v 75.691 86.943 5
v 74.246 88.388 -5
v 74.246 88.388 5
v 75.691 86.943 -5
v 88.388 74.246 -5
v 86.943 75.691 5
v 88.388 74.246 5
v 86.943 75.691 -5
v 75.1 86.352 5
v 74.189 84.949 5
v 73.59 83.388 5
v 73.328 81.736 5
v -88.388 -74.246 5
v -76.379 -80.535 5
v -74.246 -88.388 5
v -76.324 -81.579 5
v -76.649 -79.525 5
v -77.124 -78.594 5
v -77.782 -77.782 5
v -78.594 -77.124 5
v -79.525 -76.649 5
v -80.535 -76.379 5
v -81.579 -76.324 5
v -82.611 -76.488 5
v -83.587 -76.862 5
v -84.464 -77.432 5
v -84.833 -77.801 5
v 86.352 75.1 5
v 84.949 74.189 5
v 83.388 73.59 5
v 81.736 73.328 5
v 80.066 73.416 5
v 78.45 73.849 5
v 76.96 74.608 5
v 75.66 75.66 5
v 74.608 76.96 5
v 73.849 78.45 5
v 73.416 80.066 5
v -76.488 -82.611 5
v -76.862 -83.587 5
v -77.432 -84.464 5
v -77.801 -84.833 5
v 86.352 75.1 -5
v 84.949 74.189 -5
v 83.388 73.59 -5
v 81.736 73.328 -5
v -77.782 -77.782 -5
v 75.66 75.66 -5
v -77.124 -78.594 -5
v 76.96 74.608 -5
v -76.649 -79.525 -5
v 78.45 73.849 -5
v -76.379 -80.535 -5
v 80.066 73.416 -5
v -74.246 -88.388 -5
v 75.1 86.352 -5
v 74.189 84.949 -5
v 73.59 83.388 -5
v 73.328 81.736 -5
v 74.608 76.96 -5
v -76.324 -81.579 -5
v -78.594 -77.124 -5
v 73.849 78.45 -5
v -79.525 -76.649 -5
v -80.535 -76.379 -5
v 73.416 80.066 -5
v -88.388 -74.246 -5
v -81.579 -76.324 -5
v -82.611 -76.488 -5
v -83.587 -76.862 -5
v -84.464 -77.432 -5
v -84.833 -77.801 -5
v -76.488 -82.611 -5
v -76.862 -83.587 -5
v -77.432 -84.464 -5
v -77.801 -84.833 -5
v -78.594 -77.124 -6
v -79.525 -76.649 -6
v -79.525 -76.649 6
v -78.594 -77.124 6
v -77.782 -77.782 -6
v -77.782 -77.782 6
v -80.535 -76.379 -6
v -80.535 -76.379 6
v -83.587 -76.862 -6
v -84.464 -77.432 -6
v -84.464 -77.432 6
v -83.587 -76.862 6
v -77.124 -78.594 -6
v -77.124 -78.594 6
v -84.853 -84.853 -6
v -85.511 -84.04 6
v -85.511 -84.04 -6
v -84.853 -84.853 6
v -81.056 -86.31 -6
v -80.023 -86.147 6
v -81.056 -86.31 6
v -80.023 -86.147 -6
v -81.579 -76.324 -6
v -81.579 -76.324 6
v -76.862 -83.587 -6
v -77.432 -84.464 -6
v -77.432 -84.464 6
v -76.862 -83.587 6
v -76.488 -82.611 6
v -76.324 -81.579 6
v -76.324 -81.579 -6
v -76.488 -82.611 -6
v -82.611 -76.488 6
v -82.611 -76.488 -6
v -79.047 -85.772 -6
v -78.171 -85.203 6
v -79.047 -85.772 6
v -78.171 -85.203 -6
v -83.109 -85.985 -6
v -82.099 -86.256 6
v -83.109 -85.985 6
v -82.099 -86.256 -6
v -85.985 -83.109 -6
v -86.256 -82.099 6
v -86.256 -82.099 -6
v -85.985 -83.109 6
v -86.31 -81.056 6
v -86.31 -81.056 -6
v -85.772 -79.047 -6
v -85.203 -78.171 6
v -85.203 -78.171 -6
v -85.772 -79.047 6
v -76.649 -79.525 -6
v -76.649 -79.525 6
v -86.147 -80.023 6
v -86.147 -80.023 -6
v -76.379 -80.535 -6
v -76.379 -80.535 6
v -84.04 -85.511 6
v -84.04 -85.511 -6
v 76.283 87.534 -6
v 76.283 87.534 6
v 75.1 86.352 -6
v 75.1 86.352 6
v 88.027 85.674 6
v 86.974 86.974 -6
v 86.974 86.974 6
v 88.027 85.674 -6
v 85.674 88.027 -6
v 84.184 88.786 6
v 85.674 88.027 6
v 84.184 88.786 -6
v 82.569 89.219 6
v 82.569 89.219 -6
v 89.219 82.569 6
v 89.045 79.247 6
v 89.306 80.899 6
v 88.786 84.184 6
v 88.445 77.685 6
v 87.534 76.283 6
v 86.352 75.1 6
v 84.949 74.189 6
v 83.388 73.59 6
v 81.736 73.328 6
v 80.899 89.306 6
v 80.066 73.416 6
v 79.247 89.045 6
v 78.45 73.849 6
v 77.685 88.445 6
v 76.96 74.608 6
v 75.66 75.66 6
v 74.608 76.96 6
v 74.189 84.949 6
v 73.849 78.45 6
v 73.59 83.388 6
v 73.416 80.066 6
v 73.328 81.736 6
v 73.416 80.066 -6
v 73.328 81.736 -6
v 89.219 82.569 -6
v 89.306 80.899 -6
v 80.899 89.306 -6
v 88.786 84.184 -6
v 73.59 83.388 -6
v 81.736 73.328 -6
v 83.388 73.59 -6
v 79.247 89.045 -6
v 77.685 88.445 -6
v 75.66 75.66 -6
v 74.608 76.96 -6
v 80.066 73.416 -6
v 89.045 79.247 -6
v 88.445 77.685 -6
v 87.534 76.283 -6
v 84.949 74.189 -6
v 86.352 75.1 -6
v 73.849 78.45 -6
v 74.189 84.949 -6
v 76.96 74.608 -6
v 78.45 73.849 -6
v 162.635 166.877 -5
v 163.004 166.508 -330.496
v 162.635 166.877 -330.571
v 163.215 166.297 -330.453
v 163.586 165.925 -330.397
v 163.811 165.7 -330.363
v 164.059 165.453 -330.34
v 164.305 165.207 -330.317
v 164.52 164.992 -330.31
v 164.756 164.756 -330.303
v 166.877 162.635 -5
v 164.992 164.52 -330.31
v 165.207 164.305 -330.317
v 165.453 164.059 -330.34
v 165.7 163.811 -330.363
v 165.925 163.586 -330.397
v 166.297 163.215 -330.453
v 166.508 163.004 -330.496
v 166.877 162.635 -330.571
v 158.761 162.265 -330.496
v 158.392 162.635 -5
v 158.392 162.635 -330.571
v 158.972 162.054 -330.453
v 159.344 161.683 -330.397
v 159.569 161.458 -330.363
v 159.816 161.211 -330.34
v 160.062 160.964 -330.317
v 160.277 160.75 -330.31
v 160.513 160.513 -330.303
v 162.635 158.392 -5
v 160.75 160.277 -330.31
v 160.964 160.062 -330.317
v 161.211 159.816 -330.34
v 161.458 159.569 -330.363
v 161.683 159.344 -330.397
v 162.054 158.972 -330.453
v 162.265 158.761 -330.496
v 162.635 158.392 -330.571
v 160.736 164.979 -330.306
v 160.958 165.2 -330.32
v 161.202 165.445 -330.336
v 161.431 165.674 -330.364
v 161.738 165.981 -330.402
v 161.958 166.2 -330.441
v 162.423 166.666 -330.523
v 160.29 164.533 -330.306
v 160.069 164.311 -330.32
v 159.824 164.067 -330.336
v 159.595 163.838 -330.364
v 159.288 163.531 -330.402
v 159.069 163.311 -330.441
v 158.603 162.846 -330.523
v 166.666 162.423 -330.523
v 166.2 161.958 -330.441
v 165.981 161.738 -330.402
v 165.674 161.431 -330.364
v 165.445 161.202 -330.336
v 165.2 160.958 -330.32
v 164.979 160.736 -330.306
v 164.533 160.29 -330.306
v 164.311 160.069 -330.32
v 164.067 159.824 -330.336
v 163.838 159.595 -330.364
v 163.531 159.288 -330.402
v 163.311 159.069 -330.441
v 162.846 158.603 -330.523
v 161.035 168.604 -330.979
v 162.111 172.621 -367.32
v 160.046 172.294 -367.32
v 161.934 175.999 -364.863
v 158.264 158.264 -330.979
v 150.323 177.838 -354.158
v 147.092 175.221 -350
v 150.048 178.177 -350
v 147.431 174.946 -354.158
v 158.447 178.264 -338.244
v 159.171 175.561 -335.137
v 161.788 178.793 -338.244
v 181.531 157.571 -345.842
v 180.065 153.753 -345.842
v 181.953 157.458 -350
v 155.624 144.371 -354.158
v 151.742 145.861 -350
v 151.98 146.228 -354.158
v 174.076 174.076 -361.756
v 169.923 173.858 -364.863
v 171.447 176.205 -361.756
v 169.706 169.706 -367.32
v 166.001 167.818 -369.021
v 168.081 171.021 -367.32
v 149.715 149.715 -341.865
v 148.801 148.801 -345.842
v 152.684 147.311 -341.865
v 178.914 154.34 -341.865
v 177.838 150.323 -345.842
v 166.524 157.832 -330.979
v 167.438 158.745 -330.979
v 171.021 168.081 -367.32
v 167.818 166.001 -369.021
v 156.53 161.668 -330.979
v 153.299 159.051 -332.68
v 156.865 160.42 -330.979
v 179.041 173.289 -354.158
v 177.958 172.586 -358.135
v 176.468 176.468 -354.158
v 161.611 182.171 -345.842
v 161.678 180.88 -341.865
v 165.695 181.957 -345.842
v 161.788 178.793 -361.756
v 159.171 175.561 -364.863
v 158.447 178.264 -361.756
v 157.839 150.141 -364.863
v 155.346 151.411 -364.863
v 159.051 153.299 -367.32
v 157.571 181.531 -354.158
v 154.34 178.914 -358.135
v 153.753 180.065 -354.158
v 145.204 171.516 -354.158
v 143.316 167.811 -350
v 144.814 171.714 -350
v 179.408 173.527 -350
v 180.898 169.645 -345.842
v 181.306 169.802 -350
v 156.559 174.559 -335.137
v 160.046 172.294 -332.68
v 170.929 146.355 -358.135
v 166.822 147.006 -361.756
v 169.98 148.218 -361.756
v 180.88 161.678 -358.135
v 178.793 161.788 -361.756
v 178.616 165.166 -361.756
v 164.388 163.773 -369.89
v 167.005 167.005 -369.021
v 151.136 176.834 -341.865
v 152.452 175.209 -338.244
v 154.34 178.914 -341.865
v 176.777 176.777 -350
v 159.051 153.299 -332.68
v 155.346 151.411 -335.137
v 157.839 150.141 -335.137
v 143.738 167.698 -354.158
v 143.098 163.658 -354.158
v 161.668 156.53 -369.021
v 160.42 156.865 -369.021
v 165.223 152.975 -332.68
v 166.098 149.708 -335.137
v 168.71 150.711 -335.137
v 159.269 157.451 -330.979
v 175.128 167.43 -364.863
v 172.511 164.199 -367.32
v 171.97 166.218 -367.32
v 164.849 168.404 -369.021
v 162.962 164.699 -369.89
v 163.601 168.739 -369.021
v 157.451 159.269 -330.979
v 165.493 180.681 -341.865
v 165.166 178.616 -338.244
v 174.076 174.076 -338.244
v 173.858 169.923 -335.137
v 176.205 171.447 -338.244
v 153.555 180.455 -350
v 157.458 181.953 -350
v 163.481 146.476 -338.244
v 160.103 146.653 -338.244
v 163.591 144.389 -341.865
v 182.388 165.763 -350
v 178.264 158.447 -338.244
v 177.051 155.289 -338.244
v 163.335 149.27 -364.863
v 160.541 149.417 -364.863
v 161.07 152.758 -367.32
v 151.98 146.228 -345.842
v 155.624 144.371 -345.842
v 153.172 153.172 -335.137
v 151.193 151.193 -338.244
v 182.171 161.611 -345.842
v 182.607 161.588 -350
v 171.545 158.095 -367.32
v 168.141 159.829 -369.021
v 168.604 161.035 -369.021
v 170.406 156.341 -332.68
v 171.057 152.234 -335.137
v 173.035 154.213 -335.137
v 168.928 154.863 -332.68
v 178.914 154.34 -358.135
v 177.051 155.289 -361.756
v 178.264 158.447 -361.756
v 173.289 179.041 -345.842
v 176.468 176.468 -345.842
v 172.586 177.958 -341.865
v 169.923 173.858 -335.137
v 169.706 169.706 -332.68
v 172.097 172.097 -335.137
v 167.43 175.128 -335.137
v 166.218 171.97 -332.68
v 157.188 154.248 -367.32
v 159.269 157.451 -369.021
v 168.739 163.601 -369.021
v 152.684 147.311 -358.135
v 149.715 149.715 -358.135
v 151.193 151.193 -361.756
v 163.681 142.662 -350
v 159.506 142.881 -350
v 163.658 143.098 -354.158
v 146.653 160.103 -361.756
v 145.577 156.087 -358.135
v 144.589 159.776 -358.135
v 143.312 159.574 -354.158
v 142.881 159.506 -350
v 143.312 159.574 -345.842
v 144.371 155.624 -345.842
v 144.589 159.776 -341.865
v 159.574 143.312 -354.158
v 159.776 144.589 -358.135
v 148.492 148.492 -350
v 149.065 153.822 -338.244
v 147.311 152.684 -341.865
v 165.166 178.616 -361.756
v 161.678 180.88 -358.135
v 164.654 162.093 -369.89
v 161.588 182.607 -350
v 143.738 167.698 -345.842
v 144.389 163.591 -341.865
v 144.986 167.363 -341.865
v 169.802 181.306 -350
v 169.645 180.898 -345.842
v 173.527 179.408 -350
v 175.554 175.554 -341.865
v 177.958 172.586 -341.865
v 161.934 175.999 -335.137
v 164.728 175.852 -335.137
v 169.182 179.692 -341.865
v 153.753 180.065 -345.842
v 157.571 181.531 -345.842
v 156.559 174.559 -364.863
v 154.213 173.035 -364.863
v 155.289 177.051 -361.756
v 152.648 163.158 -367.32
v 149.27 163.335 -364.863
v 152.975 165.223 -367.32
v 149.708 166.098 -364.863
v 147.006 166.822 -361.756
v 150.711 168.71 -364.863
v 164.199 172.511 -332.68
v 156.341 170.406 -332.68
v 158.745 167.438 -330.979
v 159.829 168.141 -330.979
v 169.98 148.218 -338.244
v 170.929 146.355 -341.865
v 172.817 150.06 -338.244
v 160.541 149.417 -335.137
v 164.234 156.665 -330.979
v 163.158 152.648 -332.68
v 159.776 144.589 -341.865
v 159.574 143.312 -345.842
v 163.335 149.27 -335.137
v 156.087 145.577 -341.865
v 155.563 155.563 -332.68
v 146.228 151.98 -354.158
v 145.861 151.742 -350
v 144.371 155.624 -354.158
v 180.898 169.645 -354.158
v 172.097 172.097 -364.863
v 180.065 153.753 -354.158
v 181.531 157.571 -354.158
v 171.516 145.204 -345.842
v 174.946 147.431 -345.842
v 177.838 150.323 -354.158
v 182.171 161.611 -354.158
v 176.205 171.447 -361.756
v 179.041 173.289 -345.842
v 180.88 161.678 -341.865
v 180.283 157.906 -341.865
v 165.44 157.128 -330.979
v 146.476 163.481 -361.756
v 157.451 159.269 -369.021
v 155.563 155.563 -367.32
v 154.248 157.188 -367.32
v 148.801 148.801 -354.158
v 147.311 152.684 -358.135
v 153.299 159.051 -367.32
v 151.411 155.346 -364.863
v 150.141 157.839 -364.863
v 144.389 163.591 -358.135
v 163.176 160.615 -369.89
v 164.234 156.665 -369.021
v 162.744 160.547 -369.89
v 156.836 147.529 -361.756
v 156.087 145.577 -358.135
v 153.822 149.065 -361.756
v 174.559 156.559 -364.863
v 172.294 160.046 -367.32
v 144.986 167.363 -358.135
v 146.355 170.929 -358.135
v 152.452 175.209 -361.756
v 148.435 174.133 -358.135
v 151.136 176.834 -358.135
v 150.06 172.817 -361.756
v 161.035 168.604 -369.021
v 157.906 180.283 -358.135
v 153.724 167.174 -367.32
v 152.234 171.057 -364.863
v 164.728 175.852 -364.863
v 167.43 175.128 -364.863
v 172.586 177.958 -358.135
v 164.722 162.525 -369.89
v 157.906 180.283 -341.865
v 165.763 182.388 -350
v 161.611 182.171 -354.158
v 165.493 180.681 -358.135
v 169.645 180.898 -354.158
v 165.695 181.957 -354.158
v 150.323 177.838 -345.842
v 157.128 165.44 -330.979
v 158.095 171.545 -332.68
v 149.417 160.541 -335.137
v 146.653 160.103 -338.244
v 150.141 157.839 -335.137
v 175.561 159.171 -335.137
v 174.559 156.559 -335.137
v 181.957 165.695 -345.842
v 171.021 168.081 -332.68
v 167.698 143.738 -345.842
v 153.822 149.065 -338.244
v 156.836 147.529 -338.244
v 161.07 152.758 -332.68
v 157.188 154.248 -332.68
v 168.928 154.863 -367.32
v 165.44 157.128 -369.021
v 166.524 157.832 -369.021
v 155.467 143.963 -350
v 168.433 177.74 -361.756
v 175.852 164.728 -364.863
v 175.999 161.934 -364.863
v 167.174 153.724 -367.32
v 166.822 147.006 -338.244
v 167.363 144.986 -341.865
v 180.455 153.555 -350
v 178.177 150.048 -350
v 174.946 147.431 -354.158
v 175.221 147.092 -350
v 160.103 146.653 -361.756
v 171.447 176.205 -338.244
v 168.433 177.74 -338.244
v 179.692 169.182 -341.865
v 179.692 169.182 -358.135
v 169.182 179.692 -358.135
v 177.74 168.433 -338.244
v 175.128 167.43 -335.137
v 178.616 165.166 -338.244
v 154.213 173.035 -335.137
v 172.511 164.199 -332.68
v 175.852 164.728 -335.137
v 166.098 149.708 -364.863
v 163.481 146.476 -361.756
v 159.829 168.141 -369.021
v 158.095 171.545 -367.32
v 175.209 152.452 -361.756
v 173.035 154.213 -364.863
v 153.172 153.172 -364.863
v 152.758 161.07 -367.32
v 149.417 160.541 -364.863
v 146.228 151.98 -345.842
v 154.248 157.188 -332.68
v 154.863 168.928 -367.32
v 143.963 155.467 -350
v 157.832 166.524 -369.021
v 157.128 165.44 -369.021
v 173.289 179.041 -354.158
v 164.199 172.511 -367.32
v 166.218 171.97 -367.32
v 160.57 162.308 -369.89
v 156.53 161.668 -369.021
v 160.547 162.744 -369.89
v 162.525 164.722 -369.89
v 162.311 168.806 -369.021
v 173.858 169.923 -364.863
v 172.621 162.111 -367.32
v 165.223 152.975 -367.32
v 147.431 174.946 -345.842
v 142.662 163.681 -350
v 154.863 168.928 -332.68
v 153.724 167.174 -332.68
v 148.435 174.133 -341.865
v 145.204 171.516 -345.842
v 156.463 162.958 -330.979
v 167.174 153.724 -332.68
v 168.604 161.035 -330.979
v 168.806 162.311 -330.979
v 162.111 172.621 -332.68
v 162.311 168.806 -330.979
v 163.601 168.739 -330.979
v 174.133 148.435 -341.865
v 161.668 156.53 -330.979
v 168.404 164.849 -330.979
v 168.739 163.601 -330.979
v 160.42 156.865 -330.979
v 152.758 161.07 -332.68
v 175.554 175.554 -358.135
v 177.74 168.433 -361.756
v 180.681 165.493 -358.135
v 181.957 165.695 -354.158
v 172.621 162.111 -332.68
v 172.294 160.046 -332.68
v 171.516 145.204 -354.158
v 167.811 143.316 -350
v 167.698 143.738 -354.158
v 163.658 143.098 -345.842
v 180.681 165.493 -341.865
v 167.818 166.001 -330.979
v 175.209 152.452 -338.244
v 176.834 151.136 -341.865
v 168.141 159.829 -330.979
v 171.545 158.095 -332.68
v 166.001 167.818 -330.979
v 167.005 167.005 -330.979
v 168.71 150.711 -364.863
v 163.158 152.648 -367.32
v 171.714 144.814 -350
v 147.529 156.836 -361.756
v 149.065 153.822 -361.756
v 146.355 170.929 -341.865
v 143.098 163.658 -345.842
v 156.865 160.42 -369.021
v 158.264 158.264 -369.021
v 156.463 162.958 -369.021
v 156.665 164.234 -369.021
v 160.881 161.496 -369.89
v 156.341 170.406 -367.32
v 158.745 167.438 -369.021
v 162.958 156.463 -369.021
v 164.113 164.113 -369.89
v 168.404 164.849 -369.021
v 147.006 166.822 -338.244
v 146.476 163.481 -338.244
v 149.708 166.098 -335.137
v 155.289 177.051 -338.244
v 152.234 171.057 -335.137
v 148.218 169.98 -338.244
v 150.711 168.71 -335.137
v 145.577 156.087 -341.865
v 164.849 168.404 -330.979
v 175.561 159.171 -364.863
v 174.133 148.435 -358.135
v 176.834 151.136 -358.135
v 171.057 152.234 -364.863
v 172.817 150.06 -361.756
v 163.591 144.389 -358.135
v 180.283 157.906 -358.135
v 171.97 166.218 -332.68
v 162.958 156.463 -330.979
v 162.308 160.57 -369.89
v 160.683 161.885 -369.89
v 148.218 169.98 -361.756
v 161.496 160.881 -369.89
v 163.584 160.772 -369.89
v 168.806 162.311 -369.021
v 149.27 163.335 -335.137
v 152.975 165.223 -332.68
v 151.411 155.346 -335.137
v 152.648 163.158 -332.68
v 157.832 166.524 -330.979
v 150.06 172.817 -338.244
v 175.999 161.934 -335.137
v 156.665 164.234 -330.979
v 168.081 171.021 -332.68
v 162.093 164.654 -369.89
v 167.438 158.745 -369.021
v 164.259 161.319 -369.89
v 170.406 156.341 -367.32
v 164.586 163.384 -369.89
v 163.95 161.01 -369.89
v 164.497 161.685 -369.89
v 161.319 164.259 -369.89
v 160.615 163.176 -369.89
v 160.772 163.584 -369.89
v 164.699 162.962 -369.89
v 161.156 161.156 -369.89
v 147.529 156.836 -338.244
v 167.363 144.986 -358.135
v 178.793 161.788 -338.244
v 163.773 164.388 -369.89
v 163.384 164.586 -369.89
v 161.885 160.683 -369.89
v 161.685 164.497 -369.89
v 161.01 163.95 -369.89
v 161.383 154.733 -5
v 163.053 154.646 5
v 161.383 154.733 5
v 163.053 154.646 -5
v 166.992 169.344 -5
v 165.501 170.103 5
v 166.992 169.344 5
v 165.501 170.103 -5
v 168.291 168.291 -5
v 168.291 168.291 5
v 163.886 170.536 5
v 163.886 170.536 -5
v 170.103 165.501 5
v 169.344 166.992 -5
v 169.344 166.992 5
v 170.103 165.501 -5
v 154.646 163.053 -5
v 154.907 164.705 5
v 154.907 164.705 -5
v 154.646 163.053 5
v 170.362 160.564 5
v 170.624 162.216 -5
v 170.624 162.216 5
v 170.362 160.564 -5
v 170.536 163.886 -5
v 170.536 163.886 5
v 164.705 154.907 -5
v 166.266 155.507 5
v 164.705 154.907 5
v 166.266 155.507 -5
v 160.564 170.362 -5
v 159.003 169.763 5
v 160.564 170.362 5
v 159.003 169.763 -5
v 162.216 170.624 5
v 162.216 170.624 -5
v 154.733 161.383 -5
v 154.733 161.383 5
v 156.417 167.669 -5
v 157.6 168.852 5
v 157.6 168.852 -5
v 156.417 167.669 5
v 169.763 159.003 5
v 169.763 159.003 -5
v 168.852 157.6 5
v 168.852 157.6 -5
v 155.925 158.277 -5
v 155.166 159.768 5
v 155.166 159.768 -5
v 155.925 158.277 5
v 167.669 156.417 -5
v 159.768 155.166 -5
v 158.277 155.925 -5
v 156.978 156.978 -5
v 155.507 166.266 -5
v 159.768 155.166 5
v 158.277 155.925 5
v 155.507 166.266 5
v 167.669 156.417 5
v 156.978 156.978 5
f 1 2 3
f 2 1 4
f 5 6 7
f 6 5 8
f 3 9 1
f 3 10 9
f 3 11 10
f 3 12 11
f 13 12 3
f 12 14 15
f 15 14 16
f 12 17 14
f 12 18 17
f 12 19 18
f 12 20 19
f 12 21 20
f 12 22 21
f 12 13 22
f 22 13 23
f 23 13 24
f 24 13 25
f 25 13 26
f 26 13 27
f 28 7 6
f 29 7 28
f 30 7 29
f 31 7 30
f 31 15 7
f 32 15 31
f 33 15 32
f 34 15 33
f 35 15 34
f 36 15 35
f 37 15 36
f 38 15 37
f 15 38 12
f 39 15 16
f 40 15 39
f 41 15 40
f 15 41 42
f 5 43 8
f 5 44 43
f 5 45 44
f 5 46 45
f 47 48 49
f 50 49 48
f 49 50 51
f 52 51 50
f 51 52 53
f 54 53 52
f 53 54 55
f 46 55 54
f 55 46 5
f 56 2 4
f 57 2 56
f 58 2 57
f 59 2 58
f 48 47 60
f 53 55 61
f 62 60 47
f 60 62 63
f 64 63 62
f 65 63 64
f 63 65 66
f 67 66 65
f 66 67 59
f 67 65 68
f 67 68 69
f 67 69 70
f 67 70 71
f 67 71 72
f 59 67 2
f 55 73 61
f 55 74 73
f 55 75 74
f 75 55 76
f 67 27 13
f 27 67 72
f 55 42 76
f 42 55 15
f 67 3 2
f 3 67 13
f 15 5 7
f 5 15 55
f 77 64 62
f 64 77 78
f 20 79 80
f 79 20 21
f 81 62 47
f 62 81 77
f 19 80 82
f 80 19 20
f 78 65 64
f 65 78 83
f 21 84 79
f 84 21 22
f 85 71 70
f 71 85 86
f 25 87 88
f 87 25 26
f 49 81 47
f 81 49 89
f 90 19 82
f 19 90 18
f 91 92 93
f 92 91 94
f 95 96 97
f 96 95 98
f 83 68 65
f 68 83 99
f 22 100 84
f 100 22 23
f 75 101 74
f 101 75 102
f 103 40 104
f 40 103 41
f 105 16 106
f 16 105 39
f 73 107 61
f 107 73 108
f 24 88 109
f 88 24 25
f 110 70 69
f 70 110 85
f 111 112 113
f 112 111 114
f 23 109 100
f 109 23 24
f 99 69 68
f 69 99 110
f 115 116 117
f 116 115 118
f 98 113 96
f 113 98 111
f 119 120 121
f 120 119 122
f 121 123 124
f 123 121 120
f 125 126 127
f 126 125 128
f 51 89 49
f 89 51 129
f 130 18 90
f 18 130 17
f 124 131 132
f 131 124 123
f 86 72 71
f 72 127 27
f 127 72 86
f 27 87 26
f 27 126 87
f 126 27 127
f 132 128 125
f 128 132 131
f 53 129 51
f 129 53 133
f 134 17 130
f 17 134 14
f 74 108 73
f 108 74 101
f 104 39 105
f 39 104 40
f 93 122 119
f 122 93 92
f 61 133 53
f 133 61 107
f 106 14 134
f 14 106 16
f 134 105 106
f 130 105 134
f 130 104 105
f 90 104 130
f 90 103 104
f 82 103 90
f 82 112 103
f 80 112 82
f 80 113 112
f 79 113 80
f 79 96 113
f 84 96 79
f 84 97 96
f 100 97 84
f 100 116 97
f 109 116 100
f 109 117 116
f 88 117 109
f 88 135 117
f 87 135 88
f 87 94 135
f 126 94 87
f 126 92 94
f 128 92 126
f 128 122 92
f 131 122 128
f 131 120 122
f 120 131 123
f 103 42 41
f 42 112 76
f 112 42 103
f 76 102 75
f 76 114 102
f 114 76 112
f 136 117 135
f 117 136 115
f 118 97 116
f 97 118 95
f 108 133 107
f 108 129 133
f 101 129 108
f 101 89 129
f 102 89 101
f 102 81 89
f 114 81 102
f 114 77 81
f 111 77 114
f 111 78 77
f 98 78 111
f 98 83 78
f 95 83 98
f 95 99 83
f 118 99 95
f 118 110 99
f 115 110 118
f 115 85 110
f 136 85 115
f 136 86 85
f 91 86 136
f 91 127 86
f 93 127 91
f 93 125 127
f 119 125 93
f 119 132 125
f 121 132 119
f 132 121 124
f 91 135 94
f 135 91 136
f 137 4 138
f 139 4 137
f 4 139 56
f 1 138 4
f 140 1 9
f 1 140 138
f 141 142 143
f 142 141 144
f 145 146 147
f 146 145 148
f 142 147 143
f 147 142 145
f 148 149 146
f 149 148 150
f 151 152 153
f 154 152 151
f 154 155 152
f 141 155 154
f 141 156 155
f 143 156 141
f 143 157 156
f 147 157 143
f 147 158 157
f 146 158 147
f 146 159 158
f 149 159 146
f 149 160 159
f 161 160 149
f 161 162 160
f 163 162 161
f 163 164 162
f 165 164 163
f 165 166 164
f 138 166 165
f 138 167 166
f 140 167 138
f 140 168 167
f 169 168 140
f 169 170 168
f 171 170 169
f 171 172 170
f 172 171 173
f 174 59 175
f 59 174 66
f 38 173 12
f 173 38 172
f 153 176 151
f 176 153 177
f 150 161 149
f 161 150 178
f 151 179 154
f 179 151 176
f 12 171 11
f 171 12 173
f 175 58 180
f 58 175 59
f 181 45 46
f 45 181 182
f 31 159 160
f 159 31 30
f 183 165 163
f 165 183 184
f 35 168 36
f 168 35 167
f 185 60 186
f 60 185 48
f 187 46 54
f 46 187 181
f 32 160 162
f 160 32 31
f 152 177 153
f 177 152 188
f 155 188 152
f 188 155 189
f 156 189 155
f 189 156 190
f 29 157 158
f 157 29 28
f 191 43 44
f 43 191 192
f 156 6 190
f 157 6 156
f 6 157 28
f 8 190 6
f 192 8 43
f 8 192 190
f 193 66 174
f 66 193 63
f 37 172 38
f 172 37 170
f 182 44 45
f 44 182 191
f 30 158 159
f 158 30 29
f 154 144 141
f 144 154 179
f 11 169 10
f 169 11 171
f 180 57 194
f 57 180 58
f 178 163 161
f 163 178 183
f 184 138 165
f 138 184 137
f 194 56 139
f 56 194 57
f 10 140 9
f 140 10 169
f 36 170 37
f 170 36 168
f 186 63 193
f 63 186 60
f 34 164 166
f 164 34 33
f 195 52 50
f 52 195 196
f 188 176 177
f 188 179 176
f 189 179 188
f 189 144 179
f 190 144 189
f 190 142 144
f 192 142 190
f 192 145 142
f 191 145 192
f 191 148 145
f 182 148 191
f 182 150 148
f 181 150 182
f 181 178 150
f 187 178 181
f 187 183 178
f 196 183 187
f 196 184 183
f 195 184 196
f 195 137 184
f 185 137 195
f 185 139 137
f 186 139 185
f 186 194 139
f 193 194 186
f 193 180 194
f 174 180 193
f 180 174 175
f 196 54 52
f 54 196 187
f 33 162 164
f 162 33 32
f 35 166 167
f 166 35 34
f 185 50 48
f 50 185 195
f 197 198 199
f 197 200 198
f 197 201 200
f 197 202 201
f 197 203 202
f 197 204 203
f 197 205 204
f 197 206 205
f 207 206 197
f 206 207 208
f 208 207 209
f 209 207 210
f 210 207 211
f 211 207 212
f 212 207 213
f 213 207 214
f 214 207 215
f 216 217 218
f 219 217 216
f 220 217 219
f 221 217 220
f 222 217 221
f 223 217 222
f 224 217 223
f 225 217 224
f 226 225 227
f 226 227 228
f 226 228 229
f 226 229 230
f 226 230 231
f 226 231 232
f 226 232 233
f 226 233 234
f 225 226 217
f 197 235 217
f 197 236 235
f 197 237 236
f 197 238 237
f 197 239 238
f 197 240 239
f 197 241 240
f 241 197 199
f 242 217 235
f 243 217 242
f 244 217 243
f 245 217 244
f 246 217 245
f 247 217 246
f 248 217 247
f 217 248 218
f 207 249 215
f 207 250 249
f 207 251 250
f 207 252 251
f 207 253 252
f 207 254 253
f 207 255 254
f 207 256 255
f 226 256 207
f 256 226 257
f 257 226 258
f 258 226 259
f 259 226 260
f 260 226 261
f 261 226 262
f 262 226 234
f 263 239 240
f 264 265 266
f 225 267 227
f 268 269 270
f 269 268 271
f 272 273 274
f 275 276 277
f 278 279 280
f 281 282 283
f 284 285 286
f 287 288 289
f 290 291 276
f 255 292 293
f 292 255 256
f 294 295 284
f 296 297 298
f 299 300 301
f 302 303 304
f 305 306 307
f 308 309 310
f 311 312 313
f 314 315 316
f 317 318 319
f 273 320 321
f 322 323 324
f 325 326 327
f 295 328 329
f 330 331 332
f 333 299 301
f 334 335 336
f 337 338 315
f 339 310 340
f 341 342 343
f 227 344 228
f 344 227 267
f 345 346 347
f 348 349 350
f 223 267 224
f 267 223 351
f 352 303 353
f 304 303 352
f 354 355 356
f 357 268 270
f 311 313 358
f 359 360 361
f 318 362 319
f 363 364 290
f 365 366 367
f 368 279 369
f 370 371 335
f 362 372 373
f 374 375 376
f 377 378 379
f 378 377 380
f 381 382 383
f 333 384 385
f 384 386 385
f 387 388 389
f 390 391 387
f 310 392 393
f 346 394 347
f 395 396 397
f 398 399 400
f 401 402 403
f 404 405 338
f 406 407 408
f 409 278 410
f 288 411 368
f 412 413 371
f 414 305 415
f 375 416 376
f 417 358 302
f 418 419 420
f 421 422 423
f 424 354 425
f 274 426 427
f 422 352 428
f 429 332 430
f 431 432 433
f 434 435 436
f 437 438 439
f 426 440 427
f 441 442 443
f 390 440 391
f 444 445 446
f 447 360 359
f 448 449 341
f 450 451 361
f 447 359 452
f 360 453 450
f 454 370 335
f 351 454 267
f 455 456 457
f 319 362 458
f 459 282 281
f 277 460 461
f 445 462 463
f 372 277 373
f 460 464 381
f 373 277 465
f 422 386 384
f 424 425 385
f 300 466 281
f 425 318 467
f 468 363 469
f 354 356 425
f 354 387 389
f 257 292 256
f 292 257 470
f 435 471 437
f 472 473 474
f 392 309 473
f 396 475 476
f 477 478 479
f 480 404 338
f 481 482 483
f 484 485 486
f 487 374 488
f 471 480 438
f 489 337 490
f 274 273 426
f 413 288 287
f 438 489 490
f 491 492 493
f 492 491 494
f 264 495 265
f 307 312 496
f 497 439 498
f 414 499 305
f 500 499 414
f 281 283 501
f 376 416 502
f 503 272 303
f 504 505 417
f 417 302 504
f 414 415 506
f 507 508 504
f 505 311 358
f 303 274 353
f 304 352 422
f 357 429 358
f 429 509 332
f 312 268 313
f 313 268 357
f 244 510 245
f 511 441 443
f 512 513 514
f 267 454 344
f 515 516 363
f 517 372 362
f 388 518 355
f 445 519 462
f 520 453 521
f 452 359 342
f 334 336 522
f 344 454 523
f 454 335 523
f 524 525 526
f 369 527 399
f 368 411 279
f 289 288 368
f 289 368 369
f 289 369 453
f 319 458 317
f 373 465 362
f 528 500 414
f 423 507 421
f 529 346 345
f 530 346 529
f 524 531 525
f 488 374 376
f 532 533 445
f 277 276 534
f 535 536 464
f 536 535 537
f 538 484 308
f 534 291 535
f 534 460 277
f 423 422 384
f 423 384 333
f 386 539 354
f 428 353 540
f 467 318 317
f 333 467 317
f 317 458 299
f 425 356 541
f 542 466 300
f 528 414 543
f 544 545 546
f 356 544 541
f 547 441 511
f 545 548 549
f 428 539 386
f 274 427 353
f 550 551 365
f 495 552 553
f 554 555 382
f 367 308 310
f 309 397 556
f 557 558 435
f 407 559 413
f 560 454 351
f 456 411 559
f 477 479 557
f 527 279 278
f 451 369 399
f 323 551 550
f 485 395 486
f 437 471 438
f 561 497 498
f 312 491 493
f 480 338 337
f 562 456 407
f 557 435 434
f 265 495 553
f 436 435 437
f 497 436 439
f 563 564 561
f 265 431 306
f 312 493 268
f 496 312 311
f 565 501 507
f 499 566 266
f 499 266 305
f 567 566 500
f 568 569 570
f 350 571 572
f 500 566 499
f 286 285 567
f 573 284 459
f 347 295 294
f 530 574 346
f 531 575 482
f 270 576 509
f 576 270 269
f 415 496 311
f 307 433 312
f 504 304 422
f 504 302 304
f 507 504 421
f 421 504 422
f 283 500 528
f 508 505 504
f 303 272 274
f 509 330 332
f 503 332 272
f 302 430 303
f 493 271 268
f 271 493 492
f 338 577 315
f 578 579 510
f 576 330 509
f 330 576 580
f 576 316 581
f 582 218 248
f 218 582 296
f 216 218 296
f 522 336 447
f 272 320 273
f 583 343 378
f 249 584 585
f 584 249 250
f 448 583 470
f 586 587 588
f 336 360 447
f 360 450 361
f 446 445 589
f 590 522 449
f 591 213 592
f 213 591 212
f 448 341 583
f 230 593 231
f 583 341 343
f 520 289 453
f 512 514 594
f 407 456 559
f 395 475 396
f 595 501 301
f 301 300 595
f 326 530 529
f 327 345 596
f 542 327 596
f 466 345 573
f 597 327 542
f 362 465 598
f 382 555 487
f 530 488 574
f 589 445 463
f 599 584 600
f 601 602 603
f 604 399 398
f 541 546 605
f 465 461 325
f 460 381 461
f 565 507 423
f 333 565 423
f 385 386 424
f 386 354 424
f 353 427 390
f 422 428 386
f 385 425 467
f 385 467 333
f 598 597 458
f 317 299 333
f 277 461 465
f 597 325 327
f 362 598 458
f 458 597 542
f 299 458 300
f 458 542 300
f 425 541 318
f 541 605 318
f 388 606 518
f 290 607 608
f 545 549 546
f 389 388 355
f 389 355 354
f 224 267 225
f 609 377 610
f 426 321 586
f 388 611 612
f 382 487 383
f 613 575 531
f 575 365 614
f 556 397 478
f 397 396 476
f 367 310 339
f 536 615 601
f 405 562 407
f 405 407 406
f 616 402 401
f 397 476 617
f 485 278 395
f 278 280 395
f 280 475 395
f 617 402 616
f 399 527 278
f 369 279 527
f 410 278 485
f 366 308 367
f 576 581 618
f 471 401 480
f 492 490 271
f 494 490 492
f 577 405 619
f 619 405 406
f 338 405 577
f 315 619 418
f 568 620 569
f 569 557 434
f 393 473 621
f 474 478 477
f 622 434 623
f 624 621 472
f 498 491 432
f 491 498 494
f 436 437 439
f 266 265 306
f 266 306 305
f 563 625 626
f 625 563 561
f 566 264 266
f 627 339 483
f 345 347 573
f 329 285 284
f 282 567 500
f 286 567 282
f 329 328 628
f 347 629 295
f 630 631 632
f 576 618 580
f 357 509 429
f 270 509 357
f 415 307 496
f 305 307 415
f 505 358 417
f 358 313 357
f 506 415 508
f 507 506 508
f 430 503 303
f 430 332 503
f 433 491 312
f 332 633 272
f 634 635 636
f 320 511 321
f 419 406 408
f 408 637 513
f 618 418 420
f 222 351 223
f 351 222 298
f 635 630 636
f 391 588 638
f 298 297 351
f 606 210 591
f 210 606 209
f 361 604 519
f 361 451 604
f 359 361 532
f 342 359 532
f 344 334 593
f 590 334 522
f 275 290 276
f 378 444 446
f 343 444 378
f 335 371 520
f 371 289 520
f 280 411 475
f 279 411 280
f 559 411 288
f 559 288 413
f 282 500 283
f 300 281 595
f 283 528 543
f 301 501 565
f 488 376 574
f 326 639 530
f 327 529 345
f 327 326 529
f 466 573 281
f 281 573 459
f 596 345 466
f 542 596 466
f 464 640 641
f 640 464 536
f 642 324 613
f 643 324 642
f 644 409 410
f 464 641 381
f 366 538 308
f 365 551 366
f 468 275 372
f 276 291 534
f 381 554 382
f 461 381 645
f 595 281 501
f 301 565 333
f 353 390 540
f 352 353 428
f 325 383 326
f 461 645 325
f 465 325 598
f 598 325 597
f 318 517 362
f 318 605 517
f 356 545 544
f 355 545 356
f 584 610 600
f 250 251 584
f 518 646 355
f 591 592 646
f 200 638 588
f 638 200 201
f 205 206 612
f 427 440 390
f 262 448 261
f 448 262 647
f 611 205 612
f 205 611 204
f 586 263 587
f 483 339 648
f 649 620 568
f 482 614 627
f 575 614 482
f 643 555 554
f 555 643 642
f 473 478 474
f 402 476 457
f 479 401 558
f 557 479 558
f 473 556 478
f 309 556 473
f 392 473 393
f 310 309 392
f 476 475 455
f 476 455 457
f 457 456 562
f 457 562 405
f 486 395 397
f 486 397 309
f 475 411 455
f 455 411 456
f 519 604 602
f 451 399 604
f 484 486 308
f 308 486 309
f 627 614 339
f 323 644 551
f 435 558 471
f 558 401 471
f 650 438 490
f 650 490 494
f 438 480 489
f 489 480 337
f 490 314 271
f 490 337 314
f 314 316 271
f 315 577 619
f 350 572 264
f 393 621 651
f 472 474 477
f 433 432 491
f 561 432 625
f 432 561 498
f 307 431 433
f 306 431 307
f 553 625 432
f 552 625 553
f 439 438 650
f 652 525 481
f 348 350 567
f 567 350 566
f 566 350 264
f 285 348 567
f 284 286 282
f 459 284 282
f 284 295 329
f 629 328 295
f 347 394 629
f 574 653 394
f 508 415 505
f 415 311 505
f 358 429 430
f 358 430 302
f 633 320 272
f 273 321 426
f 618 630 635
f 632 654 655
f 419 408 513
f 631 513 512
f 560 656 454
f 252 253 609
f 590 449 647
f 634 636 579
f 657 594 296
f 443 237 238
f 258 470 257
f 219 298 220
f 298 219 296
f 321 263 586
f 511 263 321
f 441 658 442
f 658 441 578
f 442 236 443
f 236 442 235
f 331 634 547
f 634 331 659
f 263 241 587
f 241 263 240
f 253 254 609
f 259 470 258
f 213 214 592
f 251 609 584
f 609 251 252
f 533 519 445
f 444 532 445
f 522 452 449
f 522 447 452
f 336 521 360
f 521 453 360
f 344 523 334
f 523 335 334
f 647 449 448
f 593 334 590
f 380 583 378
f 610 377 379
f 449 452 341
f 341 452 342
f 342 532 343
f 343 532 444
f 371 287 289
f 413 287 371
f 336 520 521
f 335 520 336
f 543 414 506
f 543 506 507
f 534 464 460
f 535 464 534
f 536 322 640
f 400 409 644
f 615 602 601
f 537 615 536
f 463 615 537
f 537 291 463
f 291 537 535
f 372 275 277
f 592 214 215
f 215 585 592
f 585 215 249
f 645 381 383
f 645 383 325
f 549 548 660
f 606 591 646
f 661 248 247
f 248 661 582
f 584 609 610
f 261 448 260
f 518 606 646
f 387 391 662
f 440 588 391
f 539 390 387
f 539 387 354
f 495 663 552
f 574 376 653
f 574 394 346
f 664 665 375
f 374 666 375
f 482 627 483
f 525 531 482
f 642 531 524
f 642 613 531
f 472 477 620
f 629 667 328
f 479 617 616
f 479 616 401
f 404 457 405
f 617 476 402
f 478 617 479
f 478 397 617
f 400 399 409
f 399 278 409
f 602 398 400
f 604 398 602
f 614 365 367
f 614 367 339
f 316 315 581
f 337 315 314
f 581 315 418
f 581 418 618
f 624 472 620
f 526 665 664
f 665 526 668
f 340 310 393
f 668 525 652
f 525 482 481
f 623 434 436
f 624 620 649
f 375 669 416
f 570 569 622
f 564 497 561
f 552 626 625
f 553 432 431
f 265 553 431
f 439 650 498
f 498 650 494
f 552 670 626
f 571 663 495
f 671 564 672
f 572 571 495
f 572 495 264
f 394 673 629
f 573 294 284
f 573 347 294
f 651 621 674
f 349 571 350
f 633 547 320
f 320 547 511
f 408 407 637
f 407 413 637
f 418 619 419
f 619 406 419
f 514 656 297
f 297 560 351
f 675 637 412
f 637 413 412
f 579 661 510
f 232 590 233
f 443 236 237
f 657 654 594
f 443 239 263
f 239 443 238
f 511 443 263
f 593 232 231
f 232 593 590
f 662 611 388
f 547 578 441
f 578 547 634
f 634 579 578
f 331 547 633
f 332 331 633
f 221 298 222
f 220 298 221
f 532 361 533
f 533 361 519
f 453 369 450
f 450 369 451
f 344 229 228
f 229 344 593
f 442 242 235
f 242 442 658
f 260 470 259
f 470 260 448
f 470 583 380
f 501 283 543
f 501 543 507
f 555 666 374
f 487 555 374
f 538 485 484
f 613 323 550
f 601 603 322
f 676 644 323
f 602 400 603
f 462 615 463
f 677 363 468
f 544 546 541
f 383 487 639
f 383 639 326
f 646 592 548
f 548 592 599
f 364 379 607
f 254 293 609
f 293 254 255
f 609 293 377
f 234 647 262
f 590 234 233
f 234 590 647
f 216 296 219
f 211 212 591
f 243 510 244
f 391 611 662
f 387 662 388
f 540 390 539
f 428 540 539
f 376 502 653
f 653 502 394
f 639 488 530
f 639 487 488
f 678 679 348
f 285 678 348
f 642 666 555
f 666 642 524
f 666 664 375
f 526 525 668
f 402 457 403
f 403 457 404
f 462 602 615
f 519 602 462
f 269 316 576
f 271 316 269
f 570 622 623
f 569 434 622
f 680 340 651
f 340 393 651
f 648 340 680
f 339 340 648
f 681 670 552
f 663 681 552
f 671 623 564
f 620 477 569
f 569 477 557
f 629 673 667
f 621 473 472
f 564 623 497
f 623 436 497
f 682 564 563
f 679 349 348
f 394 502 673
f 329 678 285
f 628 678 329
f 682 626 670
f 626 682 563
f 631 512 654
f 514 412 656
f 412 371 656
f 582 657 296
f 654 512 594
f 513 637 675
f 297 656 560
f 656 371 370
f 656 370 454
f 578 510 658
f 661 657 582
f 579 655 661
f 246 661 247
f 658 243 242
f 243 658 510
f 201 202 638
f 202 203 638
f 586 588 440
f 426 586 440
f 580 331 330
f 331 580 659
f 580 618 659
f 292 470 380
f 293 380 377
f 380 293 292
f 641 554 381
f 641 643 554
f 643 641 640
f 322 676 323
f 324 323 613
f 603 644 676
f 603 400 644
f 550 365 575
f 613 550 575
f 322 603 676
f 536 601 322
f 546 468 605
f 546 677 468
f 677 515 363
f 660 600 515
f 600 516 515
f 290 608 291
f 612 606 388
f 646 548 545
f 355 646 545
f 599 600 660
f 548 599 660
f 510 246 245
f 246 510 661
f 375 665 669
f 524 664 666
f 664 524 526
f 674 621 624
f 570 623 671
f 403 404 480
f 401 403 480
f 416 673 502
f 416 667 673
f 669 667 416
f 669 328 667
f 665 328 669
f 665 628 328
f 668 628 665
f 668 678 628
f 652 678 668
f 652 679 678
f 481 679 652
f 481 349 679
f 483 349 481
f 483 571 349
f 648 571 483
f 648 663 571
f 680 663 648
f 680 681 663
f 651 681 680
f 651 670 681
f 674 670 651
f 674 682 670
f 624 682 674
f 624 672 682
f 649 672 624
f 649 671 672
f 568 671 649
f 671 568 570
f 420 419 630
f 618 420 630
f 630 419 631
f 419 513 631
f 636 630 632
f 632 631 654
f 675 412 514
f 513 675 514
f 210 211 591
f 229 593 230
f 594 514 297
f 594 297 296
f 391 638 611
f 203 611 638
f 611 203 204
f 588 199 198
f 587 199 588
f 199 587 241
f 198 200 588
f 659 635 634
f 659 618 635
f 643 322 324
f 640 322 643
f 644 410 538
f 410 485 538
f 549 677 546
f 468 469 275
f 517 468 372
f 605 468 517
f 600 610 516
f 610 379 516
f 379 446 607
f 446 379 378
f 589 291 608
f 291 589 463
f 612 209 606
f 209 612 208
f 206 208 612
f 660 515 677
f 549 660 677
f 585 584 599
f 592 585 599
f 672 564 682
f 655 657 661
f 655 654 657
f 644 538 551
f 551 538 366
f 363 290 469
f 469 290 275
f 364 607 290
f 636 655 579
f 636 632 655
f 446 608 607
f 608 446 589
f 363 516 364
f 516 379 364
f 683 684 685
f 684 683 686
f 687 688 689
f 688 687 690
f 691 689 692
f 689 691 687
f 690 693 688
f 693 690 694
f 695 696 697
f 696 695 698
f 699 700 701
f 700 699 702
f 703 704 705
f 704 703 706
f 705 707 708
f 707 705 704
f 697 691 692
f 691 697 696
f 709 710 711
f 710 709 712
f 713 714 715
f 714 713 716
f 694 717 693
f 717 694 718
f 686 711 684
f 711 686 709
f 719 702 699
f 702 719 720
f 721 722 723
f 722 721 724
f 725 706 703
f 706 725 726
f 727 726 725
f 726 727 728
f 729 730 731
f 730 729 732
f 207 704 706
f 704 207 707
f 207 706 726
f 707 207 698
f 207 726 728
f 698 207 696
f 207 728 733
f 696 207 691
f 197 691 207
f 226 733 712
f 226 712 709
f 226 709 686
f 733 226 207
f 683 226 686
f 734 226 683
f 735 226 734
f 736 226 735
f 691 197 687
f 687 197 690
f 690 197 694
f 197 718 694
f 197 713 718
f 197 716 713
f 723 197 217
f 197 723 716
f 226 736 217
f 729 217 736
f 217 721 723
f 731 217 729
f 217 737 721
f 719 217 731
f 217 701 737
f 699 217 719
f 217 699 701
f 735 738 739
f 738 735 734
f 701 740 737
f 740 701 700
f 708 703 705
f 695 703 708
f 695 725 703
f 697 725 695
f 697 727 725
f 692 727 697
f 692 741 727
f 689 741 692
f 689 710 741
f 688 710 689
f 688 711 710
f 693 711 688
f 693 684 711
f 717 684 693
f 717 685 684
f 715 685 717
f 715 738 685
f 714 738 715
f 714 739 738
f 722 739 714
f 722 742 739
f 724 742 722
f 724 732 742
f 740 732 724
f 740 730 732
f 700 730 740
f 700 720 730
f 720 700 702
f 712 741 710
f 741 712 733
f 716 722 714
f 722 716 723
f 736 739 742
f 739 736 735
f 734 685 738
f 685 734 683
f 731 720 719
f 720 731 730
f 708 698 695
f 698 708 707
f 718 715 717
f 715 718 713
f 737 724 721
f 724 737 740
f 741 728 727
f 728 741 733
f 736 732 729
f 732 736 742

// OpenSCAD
// ==========================================
// PÉNDULO DE FURUTA - PARÁMETROS MECÁNICOS
// ==========================================

// --- Parámetros Geométricos (los que usará Python) ---
d = 230;        // Longitud del brazo (mm) -> distancia eje motor a eje péndulo
L = 350;        // Longitud del péndulo (mm) -> distancia eje péndulo a masa
radio_eje = 8;  // Radio del eje del péndulo (mm)

// --- Parámetros de Masas (para calcular inercias) ---
masa_brazo = 150;   // gramos
masa_pendulo = 300; // gramos (incluye la masa del extremo)

// ==========================================
// MODELADO DE PIEZAS (Ejemplo simplificado)
// ==========================================

// 1. Brazo rotatorio (conexión motor - péndulo)
module brazo() {
    color("Silver") {
        rotate([0, 0, 0]) 
        cube([d, 20, 10], center=true); // Brazo rectangular
        // Agujero para el eje del motor
        translate([-d/2, 0, 0]) 
        cylinder(r=5, h=12, center=true, $fn=30);
        // Agujero para el eje del péndulo (en el extremo)
        translate([d/2, 0, 0]) 
        cylinder(r=radio_eje, h=12, center=true, $fn=30);
    }
}

// 2. Péndulo (varilla + masa en extremo)
module pendulo() {
    color("Gold") {
        // Varilla
        rotate([0, 0, 0]) 
        translate([0, 0, -L/2]) 
        cube([6, 6, L], center=true);
        // Masa en el extremo (esfera)
        translate([0, 0, -L]) 
        sphere(r=20, $fn=30);
        // Agujero para el eje en la parte superior
        translate([0, 0, 0]) 
        cylinder(r=radio_eje, h=10, center=true, $fn=30);
    }
}

// ==========================================
// ENSAMBLAJE FINAL
// ==========================================

// El péndulo cuelga del extremo del brazo
rotate([0, 0, 45]) { // Brazo girado 45° para vista
    brazo();
    translate([d, 0, 0]) { // Posicionar péndulo en el extremo
        pendulo();
    }
}

// ==========================================
// EXPORTAR PARÁMETROS PARA PYTHON (Formato JSON)
// ==========================================
// Puedes copiar estos valores manualmente o usar un script 
// para extraerlos del archivo .scad
echo("PARAMETROS_PARA_PYTHON:");
echo(str("d = ", d/1000, "  # metros"));
echo(str("L = ", L/1000, "  # metros"));
echo(str("masa_brazo = ", masa_brazo/1000, "  # kg"));
echo(str("masa_pendulo = ", masa_pendulo/1000, "  # kg"));
